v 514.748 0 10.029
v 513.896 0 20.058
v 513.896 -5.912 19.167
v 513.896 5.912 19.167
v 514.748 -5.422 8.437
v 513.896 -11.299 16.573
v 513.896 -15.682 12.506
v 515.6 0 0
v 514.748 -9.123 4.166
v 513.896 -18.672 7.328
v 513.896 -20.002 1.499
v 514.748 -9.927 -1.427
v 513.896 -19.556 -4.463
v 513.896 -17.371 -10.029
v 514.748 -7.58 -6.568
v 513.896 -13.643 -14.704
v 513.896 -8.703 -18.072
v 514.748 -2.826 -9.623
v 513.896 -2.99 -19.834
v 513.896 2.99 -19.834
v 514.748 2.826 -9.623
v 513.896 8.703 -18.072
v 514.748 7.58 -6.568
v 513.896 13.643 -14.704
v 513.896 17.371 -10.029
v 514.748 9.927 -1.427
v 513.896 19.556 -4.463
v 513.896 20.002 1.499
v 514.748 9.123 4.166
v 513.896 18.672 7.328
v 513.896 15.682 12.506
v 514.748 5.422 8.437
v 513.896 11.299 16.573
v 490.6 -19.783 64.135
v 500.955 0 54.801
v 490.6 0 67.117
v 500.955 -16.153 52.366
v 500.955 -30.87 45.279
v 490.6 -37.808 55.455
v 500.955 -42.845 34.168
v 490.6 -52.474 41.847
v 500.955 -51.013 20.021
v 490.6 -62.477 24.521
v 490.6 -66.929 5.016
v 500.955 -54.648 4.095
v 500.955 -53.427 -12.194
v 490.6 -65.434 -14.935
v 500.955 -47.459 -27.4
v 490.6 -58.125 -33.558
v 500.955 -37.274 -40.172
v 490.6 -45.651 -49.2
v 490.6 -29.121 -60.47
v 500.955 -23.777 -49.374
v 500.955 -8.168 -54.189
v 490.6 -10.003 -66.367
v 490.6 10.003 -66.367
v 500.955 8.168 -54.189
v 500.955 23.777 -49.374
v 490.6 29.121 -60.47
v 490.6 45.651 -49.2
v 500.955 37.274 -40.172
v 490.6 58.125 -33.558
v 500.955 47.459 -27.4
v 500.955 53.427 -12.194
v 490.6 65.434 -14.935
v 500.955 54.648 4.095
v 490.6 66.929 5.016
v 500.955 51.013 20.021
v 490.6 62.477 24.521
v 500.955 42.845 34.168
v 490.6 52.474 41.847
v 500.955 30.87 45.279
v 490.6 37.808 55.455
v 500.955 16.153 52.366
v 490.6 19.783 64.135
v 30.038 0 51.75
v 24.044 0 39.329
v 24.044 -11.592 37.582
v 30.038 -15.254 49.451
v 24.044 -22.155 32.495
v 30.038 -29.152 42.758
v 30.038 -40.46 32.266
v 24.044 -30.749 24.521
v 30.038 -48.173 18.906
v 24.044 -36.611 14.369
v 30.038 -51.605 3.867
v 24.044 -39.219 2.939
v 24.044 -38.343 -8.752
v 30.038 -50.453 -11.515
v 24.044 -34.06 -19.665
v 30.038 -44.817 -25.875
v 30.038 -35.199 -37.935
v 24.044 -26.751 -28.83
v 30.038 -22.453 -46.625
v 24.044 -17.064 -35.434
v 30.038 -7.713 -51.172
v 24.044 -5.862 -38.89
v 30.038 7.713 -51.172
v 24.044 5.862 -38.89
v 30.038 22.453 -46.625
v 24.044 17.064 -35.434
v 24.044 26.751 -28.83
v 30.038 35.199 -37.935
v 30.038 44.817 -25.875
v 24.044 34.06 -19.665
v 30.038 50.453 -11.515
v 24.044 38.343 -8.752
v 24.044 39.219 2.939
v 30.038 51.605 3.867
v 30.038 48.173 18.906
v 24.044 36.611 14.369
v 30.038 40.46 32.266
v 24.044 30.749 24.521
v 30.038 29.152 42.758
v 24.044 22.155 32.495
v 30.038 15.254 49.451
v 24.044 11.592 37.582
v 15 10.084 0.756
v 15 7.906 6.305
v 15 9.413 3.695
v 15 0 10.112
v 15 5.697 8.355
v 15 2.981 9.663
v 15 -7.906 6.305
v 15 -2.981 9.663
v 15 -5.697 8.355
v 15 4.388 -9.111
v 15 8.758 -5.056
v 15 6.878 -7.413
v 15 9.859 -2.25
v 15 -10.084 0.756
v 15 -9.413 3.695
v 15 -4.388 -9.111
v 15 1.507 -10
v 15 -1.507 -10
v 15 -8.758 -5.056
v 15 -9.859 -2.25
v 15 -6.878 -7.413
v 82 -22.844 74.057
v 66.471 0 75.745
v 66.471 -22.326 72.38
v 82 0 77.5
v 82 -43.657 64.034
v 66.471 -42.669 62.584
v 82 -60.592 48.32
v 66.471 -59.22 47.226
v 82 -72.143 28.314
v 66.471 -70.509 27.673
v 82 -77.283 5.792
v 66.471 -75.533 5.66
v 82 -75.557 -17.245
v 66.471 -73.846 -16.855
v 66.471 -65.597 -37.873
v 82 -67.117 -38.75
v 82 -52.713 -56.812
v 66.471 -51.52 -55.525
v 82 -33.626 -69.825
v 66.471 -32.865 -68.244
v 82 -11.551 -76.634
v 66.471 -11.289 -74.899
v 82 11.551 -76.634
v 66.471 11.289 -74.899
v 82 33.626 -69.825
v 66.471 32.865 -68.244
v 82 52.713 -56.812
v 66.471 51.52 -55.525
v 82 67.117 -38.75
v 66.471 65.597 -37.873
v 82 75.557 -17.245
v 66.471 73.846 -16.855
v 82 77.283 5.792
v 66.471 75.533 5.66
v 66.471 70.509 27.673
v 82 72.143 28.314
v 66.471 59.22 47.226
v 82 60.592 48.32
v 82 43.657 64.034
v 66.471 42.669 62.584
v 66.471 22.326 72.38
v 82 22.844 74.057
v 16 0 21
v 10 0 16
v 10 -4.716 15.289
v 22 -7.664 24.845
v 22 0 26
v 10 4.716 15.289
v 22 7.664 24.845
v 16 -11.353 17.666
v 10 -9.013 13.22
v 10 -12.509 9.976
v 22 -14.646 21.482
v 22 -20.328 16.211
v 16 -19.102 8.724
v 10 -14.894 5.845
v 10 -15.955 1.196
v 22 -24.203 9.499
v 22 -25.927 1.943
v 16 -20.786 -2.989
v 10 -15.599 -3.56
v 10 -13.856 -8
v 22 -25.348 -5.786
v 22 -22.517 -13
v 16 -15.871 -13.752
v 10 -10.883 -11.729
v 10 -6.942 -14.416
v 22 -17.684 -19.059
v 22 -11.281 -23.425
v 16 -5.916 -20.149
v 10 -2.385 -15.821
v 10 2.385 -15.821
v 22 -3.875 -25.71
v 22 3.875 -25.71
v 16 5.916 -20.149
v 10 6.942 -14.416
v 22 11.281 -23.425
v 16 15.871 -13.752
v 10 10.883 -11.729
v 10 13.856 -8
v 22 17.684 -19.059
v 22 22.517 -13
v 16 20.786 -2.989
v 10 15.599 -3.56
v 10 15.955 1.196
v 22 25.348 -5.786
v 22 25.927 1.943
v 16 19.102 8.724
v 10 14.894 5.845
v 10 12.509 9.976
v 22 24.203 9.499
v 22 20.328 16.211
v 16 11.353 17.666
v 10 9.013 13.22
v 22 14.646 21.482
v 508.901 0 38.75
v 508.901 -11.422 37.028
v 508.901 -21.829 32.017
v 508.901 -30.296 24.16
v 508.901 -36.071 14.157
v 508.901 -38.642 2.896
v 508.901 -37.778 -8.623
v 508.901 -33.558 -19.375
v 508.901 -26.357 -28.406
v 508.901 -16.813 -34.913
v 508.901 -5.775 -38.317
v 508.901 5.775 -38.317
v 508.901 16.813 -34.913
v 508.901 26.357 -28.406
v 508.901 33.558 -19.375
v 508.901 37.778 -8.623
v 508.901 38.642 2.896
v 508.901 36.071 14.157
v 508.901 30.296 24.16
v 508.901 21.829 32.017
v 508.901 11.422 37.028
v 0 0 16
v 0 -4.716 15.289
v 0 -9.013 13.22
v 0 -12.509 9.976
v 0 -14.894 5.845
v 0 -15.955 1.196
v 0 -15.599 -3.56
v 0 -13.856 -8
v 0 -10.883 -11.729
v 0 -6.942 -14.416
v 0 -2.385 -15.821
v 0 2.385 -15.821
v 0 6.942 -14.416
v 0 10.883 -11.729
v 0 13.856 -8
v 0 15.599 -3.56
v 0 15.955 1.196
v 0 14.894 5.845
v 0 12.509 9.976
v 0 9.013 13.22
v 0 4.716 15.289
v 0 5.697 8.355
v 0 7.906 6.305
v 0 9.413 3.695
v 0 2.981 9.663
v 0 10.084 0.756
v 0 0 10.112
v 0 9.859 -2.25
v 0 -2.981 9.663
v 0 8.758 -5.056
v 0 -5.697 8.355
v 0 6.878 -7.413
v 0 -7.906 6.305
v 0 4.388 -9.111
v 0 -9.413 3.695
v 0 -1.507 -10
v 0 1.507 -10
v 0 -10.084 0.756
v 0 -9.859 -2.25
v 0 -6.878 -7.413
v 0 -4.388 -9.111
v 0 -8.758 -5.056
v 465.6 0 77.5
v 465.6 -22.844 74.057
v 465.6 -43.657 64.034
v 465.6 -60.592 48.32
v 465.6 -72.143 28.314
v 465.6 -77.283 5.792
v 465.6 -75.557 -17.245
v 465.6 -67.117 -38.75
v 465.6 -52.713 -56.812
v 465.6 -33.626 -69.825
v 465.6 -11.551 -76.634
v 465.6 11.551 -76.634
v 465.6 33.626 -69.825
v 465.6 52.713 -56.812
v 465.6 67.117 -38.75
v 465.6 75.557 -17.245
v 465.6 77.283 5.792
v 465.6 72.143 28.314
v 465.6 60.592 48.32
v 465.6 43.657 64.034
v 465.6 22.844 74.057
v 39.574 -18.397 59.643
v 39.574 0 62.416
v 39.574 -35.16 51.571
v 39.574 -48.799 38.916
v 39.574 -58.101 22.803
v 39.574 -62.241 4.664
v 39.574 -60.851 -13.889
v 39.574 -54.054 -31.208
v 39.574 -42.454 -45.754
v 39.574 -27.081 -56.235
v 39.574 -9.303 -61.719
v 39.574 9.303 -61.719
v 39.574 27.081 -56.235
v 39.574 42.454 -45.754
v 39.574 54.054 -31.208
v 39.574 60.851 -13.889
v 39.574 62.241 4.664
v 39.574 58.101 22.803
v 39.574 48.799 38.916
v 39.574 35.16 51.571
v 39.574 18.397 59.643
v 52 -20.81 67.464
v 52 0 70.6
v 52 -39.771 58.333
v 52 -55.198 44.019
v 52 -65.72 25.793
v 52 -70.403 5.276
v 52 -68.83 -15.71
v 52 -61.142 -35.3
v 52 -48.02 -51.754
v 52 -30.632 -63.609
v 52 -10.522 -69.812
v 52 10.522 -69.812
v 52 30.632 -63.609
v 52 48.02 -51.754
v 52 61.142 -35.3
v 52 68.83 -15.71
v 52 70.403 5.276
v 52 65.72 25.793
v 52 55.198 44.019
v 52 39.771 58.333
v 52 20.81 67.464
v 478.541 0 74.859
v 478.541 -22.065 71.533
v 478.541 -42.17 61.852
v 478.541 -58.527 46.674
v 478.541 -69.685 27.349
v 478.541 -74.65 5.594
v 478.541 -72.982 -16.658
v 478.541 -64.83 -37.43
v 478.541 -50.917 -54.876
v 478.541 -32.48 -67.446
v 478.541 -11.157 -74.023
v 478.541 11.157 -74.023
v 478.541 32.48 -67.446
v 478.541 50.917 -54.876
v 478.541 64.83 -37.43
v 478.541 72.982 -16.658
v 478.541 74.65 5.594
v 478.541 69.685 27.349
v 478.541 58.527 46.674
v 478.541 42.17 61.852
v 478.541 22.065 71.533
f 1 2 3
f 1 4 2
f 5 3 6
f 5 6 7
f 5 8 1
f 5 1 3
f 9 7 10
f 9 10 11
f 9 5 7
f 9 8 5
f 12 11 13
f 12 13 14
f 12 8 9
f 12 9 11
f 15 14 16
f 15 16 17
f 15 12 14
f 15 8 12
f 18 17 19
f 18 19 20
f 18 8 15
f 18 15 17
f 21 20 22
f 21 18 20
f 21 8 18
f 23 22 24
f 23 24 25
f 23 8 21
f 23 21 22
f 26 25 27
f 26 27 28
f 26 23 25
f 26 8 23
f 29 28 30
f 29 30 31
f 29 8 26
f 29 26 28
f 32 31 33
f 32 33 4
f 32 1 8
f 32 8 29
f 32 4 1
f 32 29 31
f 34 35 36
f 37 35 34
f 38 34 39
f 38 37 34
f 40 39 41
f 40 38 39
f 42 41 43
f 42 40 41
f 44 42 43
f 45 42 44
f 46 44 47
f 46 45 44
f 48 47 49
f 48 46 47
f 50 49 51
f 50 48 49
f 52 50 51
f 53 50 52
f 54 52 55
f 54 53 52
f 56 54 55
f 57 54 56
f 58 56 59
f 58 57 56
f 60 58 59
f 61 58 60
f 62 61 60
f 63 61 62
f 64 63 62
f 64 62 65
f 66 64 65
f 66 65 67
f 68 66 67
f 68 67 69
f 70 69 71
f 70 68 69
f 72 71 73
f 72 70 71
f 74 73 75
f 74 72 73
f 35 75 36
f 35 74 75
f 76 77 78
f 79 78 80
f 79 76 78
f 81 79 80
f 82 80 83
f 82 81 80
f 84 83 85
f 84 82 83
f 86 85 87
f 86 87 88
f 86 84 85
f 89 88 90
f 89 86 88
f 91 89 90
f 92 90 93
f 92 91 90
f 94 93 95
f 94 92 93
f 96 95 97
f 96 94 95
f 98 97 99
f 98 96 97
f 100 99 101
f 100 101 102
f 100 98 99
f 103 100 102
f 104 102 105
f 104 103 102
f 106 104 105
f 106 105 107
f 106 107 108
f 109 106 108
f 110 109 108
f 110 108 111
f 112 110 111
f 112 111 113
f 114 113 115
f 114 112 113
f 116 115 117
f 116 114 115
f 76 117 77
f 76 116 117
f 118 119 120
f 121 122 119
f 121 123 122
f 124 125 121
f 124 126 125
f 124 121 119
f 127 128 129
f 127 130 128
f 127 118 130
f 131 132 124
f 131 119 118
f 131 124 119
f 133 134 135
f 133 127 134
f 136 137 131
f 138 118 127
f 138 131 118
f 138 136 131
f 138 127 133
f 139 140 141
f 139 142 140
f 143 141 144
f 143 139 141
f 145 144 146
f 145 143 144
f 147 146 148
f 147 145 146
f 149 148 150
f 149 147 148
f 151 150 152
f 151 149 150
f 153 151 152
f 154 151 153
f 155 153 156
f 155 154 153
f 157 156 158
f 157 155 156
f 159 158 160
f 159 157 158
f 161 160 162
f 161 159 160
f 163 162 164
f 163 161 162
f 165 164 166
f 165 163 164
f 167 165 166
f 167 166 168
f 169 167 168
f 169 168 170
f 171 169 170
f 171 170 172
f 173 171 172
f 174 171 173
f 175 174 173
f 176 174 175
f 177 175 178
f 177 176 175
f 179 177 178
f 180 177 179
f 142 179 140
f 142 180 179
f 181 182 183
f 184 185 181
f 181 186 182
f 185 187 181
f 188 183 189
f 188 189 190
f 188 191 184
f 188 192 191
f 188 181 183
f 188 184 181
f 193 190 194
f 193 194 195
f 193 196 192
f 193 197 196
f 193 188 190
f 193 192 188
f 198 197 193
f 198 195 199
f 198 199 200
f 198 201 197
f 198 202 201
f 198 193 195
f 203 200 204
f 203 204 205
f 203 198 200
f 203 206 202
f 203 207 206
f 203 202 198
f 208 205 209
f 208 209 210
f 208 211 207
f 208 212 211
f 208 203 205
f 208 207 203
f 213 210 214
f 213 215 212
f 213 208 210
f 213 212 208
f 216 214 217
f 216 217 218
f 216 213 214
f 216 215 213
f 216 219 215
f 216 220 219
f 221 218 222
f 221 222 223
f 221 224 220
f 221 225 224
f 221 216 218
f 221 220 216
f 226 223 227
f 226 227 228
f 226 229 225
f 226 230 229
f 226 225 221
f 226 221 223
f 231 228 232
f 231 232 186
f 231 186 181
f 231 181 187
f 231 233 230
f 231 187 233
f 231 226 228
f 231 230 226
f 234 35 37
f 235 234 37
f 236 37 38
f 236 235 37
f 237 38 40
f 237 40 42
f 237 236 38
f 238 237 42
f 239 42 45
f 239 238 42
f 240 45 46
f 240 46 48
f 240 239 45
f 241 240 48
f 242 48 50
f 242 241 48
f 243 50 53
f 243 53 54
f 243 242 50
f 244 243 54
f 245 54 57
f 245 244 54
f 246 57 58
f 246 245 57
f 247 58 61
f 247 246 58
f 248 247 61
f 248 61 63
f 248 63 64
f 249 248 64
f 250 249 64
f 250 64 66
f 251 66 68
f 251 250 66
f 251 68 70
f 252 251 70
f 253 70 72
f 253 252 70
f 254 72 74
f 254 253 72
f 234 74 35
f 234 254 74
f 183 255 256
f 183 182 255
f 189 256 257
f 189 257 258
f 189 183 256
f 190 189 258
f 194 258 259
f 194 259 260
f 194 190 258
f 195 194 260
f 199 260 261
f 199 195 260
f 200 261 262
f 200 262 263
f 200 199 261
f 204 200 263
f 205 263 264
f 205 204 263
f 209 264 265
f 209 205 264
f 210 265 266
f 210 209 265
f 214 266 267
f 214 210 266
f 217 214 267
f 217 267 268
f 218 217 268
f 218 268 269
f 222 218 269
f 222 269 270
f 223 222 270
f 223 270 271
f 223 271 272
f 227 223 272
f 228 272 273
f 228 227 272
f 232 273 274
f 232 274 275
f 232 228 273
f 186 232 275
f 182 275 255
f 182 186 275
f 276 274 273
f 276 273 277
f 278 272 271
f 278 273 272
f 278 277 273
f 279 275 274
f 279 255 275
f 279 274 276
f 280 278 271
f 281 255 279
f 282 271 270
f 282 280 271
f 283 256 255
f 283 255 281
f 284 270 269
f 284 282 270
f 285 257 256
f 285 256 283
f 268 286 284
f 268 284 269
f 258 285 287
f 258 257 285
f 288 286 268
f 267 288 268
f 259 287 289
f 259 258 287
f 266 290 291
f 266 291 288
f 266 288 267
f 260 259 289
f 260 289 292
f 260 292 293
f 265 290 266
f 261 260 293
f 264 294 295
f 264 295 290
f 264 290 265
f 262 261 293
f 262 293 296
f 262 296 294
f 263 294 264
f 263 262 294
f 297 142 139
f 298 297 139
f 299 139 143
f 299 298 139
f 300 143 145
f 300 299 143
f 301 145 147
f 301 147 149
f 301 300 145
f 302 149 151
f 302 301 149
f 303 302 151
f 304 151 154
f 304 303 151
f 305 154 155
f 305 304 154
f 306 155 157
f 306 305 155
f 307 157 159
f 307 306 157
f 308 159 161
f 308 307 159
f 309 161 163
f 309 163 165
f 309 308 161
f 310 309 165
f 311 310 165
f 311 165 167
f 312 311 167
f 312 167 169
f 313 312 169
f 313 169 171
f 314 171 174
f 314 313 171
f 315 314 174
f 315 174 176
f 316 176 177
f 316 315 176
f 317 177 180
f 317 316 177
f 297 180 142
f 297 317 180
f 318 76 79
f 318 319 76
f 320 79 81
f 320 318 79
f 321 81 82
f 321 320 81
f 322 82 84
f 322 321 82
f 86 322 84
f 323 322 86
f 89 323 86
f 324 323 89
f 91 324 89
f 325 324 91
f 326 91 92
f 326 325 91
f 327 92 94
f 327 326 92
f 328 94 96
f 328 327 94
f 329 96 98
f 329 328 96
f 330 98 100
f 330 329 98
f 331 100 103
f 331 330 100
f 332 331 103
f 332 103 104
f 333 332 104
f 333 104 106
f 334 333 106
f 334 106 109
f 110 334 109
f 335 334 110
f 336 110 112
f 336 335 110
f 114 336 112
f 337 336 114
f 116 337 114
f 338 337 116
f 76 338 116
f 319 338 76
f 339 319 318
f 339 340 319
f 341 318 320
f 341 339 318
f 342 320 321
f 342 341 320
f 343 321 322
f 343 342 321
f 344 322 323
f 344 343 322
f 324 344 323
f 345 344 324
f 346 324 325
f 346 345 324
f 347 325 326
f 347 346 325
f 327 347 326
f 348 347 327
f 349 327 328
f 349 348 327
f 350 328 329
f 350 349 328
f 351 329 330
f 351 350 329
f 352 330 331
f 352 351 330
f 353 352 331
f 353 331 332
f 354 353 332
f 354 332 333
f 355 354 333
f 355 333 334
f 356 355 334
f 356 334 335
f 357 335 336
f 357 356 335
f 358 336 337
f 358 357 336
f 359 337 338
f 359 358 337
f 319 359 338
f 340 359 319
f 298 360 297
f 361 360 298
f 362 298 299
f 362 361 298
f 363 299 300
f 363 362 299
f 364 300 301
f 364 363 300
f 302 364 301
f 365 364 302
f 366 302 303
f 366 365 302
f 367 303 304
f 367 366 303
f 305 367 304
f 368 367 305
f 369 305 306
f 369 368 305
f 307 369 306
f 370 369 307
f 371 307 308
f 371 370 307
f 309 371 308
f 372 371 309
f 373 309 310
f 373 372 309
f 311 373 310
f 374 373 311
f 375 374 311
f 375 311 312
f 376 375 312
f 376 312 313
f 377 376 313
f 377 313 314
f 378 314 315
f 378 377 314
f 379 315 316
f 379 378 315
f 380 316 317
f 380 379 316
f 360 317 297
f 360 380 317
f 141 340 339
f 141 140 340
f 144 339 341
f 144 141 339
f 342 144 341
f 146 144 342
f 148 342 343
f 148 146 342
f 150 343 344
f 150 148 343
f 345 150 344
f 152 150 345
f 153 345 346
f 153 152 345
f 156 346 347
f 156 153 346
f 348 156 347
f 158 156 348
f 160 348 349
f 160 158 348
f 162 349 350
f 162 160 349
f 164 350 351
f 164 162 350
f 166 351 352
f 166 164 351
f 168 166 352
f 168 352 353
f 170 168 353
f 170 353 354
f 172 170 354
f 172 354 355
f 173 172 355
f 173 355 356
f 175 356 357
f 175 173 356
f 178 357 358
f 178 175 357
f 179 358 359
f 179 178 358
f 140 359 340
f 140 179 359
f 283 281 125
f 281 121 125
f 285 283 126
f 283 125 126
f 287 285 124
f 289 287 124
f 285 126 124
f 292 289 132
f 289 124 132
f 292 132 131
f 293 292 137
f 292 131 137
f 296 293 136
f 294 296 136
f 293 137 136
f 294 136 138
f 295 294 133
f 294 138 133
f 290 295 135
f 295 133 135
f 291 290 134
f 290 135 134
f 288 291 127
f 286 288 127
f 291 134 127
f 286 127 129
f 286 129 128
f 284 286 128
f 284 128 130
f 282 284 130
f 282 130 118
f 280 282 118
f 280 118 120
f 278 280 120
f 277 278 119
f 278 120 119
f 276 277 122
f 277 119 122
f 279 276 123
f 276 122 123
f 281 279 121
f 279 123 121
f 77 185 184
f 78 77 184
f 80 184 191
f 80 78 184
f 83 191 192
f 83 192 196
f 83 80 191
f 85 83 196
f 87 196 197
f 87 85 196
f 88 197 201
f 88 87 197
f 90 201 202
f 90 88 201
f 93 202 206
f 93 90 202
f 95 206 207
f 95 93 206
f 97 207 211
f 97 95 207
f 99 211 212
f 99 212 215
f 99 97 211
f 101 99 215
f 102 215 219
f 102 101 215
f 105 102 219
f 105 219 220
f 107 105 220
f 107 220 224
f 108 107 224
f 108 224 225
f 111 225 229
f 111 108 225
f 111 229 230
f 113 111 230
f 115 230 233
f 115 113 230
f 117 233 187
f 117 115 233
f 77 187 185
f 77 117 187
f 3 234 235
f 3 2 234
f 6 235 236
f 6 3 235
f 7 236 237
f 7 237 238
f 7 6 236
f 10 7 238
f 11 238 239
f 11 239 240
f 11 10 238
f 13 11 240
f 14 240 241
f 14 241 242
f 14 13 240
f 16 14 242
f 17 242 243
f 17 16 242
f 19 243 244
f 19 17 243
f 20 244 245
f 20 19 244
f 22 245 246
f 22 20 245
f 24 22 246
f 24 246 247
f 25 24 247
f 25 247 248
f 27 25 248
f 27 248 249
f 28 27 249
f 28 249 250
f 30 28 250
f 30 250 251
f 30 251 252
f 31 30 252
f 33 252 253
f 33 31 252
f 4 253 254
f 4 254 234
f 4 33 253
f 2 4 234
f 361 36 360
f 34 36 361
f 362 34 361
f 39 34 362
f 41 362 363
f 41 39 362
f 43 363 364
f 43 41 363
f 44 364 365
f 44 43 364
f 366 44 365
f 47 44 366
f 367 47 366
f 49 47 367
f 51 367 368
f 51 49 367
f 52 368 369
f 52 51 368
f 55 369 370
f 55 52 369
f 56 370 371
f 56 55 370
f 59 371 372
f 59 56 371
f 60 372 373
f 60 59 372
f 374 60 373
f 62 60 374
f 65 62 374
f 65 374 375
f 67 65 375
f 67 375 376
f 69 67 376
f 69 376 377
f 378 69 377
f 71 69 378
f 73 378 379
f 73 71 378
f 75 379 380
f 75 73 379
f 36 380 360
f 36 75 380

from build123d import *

# Parameters (mm, degrees)
PORT_BORE_SKETCH_W = 16
PORT_BORE_SKETCH_H = 10.1125


with BuildPart() as part:
    # Bottle Sketch → Bottle (revolve)
    with BuildSketch(Plane.XY):
        Polygon((0, 0), (0, 16), (10, 16), (22, 26), (24.044450423, 39.329180823), (30.038475773, 51.75), (39.573593129, 62.415999231), (52, 70.600308295), (66.470857294, 75.745180054), (82, 77.5), (465.6, 77.5), (478.540952255, 74.859251537), (490.6, 67.116968793), (500.955339059, 54.800775542), (508.901270189, 38.75), (513.896291314, 20.058475995), (515.6, 0), align=None)
    revolve(axis=Axis((-1000, 0, 0), (1, 0, 0)))

    # Port Bore Sketch → Port Bore (revolve, cut)
    with BuildSketch(Plane.XY):
        with Locations((7, 5.05625)):
            Rectangle(PORT_BORE_SKETCH_W, PORT_BORE_SKETCH_H)
    revolve(axis=Axis((-1000, 0, 0), (1, 0, 0)), mode=Mode.SUBTRACT)


solid = part.part
